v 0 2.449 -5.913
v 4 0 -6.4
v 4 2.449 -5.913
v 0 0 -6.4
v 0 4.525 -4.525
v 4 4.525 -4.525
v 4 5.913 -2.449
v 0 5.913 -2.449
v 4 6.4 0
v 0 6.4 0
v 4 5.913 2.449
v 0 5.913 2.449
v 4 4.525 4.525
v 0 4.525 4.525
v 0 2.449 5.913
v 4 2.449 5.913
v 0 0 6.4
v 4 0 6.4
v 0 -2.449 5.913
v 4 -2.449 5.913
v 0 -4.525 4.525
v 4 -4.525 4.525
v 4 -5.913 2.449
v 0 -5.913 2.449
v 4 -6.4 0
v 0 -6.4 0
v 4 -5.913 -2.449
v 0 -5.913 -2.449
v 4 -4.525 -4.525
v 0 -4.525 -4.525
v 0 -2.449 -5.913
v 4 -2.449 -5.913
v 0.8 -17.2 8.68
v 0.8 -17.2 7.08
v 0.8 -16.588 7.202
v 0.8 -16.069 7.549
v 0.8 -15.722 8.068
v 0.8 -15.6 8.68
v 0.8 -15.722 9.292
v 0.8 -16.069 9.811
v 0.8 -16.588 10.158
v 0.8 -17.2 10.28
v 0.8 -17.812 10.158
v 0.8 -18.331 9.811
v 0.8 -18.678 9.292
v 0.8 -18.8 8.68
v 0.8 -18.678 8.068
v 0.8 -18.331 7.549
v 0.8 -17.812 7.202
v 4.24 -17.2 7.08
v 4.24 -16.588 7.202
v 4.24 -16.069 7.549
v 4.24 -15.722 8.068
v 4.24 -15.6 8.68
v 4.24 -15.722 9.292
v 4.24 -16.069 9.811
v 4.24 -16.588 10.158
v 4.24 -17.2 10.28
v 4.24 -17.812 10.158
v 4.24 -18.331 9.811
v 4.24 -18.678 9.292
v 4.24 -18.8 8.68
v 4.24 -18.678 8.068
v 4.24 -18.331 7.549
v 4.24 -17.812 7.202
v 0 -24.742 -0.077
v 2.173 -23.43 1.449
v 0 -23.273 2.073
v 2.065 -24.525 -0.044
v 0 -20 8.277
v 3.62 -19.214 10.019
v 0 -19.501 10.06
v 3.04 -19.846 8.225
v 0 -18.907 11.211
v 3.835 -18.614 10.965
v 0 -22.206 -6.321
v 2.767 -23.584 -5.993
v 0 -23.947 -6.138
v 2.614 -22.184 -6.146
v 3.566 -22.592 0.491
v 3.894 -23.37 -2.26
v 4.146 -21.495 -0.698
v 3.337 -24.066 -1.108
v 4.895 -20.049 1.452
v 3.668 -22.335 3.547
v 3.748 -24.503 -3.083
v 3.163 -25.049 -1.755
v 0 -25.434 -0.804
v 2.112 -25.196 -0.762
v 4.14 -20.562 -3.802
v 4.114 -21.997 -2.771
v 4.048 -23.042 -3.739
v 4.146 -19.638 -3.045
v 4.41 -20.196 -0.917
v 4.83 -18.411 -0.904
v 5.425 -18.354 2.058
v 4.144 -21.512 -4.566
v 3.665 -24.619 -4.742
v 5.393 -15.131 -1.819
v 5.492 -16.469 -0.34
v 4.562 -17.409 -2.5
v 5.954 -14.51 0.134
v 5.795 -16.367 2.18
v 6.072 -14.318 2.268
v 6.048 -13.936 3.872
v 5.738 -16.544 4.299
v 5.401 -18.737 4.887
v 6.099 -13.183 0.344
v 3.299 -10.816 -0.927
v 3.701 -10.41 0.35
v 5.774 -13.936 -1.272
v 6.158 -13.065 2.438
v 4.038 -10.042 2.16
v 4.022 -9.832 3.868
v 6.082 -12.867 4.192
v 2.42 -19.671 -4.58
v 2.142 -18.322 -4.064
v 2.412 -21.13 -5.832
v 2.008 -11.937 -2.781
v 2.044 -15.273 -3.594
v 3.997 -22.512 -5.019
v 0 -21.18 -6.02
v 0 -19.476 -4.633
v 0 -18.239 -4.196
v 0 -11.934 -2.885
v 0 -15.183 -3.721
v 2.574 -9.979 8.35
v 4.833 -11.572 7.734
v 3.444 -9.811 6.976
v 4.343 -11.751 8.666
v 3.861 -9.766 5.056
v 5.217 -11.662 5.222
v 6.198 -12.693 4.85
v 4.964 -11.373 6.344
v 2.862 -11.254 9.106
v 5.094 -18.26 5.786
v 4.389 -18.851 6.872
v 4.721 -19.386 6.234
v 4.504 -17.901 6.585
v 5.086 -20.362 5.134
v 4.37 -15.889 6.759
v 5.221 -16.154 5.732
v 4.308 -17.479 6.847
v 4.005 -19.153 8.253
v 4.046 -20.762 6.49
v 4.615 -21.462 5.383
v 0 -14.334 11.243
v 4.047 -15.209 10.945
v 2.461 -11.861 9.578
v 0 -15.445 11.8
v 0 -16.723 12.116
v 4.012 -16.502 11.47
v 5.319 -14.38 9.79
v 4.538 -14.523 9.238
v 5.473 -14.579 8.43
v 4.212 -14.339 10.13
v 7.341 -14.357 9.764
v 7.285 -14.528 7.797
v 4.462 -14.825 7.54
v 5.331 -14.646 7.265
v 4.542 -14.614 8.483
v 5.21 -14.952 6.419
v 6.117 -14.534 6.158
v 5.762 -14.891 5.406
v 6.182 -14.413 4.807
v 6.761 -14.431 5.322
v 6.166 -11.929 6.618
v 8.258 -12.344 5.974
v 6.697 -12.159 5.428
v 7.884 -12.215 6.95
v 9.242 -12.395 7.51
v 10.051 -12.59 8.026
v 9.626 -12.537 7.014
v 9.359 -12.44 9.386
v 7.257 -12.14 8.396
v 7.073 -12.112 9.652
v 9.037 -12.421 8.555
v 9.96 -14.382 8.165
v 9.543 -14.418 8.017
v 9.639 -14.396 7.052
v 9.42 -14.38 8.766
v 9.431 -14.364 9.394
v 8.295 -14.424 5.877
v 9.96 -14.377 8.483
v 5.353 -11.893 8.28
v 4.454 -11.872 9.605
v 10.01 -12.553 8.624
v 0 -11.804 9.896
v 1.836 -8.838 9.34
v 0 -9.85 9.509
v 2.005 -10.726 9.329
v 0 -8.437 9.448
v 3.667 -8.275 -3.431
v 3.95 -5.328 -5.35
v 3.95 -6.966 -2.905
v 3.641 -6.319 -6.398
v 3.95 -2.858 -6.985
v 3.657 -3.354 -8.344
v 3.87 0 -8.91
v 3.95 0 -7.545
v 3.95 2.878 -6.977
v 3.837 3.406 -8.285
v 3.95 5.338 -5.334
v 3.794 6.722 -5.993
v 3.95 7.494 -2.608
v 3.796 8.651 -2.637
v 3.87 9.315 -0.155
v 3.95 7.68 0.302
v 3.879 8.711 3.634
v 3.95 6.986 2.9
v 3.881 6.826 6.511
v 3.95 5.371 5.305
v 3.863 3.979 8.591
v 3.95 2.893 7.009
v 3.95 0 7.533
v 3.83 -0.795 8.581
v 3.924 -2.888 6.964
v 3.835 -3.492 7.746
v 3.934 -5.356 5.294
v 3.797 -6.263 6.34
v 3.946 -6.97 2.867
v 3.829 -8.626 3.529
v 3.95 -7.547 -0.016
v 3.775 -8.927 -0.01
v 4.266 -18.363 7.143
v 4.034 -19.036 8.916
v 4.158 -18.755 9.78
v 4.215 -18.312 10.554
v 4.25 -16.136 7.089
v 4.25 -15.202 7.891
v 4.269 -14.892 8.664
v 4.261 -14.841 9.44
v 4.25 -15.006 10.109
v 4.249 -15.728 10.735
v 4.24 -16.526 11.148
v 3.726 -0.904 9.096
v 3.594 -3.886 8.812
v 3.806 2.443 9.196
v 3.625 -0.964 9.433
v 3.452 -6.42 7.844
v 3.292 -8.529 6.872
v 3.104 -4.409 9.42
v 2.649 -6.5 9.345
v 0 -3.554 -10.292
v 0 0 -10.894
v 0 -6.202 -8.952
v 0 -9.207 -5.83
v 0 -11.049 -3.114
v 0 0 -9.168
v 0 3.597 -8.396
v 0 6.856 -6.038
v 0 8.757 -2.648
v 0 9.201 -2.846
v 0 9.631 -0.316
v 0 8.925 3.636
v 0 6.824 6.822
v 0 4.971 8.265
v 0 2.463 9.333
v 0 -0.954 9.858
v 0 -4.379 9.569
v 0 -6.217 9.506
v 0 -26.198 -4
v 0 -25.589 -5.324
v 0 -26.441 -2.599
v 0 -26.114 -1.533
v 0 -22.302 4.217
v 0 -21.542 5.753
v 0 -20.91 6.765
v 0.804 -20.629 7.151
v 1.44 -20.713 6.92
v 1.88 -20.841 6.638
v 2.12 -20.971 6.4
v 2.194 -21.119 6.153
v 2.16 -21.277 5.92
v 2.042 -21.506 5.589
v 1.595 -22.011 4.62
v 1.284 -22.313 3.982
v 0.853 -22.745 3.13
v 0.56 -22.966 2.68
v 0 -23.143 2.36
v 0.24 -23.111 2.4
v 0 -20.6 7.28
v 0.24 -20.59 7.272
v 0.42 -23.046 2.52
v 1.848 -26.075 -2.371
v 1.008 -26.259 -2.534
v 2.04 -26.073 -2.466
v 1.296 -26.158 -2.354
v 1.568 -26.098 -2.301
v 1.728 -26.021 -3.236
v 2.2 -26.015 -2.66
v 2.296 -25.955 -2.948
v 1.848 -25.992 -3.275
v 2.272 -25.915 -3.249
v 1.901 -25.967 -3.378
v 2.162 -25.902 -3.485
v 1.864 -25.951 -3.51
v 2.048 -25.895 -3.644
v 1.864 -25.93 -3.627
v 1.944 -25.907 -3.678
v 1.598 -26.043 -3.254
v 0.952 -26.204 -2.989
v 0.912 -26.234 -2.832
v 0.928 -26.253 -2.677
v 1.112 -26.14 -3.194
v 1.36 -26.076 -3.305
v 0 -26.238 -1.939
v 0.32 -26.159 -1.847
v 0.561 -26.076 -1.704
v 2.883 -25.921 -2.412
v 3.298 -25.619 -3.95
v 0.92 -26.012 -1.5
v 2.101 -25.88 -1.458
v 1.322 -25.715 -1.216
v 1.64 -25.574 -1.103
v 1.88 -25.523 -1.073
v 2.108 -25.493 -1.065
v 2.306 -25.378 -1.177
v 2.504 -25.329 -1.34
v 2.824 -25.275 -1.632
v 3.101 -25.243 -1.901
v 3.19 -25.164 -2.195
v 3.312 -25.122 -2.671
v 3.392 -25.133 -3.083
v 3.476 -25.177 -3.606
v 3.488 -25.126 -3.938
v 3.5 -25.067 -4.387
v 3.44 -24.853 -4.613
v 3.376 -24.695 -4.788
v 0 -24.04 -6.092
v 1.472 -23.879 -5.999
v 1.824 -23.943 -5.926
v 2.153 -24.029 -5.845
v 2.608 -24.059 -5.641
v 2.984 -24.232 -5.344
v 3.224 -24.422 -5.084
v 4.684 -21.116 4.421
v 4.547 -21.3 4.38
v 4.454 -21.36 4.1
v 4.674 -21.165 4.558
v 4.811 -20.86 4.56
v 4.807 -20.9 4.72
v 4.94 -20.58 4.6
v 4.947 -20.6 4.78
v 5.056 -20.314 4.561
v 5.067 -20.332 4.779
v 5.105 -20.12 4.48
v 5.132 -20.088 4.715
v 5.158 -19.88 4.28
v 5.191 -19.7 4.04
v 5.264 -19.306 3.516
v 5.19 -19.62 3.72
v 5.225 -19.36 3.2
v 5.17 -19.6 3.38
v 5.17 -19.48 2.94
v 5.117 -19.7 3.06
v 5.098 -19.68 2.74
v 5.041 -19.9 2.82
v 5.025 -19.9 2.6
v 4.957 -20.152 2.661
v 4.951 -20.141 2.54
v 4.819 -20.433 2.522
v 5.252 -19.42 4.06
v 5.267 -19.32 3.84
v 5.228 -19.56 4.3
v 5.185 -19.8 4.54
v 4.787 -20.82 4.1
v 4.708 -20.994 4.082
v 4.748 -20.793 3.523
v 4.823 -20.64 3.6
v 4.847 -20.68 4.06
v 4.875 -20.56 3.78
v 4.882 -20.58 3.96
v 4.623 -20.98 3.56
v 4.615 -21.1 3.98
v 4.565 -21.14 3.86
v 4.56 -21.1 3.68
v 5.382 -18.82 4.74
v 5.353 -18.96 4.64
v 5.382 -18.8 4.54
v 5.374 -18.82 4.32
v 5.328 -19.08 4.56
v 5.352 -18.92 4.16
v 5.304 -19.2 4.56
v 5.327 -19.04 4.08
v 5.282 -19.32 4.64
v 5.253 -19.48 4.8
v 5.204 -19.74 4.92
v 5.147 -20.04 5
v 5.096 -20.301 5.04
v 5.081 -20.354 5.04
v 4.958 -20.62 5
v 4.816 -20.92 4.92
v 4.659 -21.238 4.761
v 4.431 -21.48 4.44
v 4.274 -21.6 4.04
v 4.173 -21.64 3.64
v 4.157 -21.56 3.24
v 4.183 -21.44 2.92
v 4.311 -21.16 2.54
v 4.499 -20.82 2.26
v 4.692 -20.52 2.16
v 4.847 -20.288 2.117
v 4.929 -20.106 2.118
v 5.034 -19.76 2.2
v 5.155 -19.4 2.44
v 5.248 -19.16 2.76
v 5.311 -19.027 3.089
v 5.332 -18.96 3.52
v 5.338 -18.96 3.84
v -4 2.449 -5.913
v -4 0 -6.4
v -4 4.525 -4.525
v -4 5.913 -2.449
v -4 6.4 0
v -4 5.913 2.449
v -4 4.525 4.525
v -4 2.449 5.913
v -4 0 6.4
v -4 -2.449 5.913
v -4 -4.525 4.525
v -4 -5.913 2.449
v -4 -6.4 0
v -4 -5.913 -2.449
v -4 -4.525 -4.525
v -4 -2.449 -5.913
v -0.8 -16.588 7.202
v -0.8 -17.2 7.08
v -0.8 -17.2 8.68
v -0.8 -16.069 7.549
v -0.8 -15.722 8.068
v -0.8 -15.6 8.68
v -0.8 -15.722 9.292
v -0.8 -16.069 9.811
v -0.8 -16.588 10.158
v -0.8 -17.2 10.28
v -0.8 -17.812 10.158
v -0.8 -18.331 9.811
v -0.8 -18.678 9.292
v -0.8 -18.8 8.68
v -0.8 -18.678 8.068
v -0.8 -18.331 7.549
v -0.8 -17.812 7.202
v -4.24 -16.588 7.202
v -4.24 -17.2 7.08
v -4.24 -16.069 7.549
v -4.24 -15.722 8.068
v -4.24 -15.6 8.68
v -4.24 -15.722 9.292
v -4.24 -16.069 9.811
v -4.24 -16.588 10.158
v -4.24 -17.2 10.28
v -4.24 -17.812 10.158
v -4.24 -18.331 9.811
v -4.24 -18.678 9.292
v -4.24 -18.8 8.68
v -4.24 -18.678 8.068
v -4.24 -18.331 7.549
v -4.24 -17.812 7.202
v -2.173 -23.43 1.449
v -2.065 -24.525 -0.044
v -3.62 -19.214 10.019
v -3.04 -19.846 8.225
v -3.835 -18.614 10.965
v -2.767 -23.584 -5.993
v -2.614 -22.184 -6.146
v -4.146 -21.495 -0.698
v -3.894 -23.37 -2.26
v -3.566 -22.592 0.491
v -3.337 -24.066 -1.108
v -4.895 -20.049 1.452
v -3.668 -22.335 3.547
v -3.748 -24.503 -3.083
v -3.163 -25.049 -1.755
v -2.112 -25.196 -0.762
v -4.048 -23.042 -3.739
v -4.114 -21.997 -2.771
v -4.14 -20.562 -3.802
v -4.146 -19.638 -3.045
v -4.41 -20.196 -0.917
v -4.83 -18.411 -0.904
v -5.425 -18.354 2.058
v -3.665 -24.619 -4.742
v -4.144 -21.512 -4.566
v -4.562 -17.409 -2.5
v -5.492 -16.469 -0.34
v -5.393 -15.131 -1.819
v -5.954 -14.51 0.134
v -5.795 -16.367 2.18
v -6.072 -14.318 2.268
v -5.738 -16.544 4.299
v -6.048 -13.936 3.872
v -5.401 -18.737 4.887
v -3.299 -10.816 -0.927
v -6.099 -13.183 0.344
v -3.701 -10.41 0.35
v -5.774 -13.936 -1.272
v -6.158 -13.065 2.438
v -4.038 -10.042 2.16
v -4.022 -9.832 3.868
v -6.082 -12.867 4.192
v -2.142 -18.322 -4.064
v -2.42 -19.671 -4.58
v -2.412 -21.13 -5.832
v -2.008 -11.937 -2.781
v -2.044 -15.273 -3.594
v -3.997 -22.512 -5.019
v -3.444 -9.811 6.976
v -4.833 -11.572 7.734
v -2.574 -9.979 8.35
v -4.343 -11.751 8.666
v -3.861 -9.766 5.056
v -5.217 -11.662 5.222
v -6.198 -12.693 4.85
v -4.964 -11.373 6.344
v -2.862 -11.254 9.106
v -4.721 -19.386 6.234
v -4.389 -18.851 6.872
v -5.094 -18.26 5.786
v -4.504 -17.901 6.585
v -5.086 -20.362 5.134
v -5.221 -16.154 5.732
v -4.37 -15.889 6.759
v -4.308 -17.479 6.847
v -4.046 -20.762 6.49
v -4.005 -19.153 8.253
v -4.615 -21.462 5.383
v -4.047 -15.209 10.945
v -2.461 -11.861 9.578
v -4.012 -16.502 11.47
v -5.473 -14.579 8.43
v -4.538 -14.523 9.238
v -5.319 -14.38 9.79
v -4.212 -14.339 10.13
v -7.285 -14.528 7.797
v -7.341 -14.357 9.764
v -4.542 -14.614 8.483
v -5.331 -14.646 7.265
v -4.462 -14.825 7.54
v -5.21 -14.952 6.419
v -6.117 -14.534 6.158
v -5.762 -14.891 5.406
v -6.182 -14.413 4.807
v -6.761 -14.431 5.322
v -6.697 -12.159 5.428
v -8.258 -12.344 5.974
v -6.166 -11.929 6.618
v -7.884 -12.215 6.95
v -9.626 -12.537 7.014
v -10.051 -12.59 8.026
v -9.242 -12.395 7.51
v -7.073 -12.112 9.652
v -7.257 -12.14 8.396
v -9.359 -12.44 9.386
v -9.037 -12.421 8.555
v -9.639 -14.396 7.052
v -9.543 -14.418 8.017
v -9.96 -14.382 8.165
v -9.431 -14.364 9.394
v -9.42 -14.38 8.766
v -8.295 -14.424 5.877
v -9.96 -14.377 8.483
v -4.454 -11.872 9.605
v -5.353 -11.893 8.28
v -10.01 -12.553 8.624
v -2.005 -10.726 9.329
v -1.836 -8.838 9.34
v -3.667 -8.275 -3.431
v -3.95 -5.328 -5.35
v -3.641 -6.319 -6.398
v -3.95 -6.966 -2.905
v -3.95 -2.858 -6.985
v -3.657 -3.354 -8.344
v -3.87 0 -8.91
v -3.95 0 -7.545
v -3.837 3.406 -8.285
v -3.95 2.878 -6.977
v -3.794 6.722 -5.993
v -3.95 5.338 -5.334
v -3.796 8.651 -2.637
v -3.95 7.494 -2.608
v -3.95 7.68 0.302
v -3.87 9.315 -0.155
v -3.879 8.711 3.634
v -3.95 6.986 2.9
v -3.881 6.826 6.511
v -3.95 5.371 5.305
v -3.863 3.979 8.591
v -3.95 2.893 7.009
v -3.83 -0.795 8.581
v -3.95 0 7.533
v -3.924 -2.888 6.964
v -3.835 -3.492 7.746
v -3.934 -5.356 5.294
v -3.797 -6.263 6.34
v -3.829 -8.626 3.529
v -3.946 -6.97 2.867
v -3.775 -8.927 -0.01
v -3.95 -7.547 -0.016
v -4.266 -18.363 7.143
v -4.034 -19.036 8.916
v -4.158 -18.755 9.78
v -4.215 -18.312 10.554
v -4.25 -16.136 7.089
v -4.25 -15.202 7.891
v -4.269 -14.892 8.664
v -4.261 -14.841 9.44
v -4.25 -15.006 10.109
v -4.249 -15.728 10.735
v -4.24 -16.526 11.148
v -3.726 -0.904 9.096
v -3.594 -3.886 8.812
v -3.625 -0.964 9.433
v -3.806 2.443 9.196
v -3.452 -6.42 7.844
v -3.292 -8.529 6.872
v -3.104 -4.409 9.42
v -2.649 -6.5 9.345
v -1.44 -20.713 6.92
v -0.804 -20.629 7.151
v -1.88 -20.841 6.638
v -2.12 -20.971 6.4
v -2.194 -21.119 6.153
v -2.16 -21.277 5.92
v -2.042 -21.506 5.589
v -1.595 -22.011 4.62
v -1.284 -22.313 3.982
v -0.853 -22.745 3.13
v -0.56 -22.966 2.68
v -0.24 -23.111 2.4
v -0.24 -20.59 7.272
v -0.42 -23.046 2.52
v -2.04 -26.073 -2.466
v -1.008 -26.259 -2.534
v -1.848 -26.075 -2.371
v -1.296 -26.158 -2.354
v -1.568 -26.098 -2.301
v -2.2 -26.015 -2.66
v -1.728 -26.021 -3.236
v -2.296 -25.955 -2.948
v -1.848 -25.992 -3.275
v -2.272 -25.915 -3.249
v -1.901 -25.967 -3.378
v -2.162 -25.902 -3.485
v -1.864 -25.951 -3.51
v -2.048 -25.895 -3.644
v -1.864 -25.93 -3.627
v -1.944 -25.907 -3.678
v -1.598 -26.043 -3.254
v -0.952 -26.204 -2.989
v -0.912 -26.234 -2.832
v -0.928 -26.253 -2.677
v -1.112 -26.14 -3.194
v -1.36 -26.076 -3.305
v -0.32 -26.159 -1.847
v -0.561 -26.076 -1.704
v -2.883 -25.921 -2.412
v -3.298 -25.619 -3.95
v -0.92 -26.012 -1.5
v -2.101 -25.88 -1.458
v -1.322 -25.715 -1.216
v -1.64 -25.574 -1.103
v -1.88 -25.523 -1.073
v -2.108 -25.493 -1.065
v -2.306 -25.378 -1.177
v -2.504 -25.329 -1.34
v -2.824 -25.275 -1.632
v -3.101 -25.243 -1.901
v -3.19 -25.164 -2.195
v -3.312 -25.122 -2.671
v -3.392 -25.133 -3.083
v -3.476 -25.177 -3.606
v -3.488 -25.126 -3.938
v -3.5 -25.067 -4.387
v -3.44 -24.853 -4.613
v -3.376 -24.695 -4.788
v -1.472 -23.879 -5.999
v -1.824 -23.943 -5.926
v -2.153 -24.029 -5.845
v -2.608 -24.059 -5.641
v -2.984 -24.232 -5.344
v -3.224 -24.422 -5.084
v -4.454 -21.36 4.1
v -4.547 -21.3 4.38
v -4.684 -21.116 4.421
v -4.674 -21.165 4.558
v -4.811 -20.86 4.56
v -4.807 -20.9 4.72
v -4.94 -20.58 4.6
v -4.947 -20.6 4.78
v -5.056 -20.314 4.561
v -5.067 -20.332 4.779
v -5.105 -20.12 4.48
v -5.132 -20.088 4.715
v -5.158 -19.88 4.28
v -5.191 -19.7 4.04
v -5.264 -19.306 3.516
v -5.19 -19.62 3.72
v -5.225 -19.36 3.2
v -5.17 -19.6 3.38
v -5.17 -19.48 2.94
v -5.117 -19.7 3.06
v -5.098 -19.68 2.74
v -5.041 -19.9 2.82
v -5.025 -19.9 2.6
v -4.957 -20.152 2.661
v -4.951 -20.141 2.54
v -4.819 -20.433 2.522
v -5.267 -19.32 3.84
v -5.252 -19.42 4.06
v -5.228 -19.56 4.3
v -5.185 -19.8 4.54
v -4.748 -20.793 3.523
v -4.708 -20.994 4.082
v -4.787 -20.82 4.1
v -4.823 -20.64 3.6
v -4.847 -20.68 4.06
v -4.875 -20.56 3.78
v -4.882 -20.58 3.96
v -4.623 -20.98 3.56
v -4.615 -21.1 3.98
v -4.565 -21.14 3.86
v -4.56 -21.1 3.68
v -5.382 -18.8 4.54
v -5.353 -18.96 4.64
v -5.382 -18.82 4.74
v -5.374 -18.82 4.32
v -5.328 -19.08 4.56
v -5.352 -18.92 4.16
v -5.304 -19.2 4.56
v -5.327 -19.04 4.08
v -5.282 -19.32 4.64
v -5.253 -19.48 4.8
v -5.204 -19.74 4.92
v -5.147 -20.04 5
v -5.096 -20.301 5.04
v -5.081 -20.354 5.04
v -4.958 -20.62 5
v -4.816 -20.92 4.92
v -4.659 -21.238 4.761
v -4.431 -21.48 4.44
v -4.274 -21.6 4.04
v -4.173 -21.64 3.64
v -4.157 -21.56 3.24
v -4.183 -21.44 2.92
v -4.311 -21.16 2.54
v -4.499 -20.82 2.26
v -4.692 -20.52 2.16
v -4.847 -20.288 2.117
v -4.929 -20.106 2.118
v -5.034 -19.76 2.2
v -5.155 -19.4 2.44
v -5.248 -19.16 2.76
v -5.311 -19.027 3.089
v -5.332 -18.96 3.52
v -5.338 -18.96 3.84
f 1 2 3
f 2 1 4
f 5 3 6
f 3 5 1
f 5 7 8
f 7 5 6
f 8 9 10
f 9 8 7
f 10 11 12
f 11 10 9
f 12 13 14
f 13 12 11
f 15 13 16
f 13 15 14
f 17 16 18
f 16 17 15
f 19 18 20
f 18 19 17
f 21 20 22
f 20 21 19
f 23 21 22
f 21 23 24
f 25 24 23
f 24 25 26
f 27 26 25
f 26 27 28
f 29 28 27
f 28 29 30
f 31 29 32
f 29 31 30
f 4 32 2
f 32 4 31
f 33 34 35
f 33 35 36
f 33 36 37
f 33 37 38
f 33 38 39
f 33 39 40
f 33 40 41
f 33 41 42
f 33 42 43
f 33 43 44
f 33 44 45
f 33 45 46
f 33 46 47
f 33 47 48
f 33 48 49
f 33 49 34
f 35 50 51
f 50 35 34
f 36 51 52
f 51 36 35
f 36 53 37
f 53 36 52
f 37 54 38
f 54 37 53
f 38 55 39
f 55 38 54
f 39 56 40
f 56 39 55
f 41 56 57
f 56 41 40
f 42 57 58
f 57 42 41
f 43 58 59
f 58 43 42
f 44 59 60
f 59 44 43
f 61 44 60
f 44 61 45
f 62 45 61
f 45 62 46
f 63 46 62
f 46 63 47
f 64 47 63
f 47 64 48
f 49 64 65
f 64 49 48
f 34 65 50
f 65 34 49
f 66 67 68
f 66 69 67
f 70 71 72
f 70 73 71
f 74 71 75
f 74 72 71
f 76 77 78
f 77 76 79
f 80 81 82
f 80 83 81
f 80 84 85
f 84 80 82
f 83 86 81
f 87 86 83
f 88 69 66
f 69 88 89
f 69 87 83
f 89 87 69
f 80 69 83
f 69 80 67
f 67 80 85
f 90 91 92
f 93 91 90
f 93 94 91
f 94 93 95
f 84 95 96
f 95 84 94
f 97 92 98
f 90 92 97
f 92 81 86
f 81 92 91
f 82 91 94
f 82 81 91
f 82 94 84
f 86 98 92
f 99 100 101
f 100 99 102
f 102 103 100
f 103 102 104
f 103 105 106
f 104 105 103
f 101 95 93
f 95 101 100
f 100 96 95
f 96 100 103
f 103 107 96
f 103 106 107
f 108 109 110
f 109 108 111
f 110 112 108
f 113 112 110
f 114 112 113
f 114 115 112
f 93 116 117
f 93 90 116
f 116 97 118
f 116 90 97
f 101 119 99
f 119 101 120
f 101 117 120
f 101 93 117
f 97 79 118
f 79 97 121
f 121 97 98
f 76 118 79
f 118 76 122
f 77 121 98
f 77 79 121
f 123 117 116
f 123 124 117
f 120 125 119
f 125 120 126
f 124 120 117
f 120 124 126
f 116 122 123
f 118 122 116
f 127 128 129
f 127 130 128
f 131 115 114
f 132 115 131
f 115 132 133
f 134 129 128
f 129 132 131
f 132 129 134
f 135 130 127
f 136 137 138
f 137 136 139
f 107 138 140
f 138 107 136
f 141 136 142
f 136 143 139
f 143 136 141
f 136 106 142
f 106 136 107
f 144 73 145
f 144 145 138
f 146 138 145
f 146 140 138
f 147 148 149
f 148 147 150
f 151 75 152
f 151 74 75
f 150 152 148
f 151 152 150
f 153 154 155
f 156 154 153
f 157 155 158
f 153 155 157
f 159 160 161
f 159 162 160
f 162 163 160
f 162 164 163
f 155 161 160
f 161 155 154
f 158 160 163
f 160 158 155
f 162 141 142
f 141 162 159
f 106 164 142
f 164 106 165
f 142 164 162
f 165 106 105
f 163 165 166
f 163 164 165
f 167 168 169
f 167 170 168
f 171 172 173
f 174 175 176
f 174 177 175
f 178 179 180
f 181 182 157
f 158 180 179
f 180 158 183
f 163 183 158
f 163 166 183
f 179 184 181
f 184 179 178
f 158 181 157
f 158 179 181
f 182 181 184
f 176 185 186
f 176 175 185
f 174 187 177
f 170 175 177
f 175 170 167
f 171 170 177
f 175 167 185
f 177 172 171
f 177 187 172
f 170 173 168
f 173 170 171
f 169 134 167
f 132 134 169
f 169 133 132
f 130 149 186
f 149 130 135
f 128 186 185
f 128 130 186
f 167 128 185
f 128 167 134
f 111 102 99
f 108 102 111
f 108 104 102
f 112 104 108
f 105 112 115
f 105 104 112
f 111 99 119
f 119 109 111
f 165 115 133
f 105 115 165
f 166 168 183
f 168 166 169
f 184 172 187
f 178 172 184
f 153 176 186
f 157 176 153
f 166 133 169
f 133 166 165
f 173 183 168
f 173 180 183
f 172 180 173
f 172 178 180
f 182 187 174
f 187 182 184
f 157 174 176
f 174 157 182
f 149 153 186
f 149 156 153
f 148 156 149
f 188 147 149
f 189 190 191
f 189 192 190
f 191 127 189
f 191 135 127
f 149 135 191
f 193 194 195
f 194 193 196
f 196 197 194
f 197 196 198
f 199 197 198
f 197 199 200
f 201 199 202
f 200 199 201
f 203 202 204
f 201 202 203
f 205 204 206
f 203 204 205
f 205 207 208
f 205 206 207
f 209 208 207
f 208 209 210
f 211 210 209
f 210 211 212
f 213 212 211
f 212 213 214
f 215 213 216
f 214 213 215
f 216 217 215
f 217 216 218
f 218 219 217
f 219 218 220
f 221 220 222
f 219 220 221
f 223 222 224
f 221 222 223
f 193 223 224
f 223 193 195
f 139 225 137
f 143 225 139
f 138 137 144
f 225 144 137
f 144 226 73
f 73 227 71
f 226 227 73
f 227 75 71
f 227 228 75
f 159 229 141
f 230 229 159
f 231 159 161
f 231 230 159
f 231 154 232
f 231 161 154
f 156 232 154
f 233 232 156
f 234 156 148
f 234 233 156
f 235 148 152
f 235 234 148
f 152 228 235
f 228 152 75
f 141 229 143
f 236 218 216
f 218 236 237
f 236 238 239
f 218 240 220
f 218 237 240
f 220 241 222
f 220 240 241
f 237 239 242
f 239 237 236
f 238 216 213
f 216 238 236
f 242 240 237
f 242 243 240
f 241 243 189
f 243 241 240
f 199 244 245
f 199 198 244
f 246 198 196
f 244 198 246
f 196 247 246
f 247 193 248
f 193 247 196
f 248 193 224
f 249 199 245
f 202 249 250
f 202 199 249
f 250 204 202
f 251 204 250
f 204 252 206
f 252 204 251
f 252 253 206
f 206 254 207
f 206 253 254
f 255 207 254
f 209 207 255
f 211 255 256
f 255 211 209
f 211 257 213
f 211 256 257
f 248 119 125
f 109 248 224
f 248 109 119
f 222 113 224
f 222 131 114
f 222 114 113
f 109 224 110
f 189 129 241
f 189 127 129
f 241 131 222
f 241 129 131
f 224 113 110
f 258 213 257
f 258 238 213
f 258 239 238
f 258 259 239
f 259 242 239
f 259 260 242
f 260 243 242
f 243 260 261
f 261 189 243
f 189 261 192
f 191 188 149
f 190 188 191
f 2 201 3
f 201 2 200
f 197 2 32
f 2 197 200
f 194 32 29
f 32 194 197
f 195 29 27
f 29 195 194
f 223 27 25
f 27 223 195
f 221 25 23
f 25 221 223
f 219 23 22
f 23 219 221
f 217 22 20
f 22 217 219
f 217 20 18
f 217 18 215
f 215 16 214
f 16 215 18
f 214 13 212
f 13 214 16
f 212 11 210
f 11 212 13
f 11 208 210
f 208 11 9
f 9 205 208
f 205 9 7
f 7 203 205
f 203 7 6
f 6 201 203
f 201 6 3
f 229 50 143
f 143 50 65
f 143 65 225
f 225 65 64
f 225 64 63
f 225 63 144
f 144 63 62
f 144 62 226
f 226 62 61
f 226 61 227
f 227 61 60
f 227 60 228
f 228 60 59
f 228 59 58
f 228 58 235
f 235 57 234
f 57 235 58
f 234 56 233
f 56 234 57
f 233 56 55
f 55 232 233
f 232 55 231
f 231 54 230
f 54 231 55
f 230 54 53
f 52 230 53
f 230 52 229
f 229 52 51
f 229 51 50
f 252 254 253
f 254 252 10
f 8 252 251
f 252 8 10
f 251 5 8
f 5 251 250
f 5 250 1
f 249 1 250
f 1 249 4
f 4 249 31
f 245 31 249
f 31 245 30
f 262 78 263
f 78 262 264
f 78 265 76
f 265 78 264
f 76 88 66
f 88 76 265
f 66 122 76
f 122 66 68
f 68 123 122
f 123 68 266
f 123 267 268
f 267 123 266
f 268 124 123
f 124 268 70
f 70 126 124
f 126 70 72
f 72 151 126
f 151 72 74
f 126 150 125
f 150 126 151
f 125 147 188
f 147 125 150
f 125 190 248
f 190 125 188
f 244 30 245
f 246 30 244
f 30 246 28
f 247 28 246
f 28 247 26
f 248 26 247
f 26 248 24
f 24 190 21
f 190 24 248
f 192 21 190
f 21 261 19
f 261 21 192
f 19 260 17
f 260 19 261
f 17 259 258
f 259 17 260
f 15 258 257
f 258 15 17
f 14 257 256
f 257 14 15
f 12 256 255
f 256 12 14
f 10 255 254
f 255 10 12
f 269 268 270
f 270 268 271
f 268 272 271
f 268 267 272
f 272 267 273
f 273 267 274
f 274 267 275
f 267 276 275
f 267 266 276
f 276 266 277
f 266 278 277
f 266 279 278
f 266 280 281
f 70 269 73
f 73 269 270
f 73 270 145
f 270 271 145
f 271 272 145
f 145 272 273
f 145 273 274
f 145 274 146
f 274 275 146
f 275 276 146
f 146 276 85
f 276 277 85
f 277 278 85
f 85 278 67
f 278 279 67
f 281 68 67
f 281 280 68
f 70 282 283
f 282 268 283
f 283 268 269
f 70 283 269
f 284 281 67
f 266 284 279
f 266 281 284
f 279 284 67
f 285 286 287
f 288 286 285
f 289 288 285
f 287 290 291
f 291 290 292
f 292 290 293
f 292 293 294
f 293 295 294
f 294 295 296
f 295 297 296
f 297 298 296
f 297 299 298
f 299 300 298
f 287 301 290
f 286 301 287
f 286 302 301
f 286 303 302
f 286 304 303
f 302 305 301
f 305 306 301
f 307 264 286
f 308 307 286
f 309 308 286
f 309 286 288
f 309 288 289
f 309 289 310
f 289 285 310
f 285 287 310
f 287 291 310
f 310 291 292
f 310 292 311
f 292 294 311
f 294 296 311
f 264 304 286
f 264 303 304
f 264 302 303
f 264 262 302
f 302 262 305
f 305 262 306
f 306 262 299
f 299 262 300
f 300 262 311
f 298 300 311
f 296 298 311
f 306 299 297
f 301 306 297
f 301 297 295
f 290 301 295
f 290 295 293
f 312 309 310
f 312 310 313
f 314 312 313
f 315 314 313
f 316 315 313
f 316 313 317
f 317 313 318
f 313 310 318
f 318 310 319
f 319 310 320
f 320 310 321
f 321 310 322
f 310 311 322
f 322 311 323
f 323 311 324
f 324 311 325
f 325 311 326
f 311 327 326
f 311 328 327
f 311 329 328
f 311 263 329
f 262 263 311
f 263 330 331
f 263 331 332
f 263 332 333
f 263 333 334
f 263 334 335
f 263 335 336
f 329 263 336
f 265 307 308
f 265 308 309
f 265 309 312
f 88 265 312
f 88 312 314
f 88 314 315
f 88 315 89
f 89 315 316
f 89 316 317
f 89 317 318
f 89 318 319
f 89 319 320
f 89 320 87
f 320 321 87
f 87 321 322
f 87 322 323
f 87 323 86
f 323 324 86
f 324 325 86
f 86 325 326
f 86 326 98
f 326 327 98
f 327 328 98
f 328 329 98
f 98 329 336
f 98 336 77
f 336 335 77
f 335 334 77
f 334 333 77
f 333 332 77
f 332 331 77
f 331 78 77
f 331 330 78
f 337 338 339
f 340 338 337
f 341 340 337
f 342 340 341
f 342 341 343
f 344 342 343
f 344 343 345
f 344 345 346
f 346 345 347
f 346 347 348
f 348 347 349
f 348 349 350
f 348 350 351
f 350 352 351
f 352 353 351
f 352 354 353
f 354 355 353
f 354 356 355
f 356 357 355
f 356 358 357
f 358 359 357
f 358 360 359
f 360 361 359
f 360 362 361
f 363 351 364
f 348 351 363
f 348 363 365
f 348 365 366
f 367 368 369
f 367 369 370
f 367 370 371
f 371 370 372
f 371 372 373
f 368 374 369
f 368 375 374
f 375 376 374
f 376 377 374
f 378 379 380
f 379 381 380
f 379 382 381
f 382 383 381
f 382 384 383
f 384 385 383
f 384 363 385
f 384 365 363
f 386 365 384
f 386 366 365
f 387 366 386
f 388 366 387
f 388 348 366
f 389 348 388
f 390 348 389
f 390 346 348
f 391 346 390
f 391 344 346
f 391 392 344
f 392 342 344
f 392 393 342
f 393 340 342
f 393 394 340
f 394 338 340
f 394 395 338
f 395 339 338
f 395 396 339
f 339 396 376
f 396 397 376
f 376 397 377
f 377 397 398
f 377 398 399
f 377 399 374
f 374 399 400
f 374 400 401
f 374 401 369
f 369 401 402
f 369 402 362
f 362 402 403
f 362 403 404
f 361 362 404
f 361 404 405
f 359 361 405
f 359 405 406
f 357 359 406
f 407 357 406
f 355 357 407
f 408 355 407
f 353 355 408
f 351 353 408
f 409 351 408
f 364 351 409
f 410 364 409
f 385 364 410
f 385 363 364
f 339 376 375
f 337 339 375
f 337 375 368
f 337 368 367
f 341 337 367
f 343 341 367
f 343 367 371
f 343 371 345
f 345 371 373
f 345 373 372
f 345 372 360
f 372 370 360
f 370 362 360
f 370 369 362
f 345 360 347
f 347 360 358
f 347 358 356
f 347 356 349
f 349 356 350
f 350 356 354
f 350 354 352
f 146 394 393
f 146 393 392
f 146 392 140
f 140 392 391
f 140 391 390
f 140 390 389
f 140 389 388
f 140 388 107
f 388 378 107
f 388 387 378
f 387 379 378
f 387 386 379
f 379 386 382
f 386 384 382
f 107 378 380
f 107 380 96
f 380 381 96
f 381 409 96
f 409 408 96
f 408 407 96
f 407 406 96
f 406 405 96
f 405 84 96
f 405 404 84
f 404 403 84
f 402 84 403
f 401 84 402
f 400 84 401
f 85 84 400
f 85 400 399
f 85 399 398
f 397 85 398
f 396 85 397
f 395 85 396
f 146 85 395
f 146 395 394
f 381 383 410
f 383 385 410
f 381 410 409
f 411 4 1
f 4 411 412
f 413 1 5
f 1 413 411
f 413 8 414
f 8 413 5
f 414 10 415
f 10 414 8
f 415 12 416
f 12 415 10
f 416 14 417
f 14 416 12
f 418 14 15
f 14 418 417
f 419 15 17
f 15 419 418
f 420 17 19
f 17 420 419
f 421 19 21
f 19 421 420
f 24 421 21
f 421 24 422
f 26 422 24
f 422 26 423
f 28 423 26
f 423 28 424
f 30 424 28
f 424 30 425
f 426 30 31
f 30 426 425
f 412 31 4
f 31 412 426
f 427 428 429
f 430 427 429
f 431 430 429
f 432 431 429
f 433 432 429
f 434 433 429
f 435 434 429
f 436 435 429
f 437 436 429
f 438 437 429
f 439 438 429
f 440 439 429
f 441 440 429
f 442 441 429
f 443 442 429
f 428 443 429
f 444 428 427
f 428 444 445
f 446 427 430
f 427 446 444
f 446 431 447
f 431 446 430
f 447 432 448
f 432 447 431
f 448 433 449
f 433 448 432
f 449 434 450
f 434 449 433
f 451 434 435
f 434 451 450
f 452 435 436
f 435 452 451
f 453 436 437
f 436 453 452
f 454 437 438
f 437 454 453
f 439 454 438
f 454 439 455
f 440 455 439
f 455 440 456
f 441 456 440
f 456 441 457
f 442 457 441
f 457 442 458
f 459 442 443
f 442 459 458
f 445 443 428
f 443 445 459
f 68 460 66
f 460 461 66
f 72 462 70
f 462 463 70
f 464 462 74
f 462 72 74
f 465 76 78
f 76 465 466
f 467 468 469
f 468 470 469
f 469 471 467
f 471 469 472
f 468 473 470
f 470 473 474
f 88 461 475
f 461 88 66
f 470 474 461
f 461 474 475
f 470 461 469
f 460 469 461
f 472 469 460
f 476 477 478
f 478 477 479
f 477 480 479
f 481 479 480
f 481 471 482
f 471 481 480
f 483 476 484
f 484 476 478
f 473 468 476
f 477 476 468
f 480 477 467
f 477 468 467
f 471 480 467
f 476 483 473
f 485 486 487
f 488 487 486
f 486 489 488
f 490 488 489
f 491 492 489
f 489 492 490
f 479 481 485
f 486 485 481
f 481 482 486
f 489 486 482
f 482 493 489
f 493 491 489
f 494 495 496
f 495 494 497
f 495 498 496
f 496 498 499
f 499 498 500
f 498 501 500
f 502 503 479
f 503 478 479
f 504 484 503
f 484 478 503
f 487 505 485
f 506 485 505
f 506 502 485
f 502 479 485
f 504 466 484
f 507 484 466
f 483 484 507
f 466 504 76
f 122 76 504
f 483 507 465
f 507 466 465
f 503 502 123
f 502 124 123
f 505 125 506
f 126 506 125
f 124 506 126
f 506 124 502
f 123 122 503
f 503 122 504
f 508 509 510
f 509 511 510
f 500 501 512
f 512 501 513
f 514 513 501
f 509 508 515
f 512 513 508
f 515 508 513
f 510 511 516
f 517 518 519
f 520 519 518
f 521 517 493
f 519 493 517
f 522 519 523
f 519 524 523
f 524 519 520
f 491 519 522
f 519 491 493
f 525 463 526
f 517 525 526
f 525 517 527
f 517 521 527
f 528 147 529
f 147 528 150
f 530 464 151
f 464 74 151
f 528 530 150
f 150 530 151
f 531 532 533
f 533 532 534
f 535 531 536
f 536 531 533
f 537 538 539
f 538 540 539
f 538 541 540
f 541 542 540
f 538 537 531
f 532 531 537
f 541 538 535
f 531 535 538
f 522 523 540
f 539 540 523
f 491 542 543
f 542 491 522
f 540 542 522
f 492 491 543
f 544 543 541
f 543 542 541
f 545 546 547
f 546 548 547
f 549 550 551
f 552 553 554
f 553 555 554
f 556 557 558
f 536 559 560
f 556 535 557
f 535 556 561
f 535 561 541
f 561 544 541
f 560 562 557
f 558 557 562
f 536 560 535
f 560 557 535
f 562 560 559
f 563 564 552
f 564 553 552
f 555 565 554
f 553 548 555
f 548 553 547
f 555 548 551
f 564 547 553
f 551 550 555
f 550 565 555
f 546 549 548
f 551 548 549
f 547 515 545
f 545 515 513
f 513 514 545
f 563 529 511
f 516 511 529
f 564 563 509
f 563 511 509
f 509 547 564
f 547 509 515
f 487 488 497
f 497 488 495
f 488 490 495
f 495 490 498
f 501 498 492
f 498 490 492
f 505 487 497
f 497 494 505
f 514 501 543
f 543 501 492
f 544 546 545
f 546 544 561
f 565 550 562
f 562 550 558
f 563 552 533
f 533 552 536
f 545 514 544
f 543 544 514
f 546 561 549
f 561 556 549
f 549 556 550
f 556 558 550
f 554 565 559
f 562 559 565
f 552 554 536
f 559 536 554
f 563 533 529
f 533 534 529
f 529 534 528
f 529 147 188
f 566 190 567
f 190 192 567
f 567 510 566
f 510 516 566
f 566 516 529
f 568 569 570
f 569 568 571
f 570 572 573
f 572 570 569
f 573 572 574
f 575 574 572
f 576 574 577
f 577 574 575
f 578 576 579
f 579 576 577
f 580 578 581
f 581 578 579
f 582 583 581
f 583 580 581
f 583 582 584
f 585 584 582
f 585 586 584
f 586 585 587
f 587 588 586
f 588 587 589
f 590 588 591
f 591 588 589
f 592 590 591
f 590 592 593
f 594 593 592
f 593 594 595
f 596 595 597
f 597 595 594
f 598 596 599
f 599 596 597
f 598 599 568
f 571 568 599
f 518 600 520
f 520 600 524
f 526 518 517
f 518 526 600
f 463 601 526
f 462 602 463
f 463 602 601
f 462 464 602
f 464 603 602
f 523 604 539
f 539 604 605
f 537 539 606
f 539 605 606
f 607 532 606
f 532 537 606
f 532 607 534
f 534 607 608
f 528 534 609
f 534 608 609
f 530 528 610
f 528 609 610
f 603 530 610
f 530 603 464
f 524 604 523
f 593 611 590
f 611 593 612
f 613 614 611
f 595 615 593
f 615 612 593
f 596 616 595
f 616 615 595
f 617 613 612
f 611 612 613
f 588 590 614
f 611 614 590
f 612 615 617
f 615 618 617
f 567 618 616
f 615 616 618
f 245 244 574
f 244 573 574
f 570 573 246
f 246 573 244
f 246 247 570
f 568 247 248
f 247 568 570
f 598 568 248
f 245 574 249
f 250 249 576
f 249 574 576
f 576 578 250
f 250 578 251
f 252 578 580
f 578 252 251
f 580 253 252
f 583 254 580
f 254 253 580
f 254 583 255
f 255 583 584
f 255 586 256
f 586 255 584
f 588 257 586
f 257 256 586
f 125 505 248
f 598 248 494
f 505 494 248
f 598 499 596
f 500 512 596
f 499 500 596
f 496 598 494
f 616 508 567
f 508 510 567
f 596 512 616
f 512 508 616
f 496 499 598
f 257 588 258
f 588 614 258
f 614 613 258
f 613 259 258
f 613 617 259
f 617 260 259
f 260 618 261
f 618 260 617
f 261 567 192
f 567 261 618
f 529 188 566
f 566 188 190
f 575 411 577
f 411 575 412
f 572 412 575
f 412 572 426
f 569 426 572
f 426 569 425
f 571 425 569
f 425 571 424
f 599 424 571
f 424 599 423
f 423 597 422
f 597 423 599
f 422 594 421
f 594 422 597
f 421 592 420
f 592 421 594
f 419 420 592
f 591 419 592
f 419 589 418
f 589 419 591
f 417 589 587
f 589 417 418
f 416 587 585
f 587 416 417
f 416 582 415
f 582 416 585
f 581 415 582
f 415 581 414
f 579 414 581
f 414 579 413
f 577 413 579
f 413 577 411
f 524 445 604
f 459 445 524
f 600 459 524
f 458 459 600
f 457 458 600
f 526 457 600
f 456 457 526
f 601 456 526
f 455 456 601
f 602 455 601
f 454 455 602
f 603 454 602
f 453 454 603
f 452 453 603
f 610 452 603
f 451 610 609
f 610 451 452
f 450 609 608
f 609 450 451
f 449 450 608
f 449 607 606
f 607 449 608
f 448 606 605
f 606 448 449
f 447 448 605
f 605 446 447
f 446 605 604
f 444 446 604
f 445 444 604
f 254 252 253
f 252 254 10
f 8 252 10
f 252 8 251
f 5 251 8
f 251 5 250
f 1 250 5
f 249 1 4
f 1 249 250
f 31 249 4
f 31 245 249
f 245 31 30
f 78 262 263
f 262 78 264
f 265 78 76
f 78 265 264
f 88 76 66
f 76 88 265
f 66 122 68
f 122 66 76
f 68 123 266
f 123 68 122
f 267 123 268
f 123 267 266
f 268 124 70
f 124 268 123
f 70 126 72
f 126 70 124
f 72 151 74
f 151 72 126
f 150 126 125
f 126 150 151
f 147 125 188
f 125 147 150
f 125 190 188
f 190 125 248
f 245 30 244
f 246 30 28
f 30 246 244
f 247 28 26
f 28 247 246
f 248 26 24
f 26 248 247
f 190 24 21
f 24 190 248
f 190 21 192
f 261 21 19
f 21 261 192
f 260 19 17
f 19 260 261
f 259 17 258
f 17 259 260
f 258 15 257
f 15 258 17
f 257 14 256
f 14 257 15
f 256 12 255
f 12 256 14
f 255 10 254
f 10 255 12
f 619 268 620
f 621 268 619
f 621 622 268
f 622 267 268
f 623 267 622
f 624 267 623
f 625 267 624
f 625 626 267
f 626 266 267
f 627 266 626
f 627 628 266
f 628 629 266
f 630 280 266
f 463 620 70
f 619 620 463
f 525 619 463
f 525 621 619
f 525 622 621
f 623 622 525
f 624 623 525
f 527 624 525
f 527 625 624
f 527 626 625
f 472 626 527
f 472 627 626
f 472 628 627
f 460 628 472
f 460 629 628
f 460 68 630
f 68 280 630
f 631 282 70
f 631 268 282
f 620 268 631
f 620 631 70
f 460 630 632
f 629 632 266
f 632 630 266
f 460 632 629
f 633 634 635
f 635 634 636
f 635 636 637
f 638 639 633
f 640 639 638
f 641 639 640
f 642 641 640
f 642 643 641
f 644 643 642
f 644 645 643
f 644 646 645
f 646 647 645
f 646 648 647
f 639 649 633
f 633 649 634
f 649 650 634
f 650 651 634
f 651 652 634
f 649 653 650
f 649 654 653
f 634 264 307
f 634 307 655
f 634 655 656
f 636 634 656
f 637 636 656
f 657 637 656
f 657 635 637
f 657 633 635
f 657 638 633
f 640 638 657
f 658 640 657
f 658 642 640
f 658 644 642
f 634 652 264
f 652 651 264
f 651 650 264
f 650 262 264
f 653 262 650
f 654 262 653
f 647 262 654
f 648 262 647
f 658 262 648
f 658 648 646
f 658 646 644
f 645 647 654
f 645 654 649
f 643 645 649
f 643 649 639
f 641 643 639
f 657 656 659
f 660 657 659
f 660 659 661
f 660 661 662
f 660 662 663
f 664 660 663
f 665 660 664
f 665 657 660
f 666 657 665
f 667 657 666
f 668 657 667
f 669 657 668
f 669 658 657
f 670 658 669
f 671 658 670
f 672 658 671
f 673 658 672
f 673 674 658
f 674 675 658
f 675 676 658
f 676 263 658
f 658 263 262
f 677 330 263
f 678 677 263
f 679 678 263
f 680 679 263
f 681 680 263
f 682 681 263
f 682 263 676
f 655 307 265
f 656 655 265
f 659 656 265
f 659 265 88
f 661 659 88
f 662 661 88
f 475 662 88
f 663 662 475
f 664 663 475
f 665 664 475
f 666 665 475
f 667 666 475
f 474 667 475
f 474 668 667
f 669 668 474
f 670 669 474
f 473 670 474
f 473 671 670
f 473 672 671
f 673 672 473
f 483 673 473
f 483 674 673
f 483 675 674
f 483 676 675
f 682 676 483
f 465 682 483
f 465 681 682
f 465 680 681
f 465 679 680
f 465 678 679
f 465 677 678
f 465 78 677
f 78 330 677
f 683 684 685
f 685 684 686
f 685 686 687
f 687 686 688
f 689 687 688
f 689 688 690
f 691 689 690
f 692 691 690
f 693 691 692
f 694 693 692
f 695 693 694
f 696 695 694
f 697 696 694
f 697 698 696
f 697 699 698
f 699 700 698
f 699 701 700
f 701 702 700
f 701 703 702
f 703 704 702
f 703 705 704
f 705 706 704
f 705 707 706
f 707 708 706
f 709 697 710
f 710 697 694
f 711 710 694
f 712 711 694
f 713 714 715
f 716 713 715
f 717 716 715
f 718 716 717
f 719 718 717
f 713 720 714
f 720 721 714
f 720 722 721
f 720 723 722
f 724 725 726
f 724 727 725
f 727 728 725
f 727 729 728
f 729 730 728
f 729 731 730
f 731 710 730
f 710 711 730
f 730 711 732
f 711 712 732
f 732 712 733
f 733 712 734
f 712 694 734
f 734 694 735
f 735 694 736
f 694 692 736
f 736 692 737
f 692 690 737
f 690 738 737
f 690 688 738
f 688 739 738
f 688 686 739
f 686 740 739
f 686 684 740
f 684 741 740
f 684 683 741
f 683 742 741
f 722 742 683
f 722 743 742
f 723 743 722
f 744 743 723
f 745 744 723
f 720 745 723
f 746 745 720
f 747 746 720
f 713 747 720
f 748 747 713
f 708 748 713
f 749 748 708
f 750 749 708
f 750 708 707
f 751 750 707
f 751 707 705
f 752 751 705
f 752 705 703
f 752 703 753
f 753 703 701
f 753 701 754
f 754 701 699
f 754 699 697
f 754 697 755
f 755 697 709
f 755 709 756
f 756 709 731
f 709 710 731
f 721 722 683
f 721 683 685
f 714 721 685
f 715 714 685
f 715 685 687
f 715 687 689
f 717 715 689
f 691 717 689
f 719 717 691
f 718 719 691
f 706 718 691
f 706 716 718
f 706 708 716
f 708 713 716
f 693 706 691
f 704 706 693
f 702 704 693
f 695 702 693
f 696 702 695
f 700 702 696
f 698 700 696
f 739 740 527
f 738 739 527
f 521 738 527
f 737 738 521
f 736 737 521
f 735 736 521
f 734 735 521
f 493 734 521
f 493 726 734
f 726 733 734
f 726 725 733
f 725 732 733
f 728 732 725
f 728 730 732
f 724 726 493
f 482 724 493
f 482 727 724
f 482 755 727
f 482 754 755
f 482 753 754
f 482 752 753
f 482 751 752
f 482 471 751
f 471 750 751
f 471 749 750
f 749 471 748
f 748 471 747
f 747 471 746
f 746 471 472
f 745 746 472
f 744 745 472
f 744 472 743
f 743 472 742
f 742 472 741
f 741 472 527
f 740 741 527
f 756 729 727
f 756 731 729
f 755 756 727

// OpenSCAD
use <../lib.scad>
use <64780p01.scad>
use <64835p01.scad>
$fa=1; $fs=0.2;
function ldraw_lib__64835p01c01(realsolid=false) = [
// 0 Animal Cow Head with Blaze, Muzzle and Eye Pattern
// 0 Name: 64835p01c01.dat
// 0 Author: Philippe Hurbain [Philo]
// 0 !LDRAW_ORG Shortcut UPDATE 2015-01
// 0 !LICENSE Licensed under CC BY 2.0 and CC BY 4.0 : see CAreadme.txt
// 
// 0 !HELP Horns coordinates: X=+/-10.6, Y=-21.7 , Z=-43
// 
// 0 BFC CERTIFY CCW
  [0,"BFC","CERTIFY"],
  [0,"BFC","CCW"],
// 
// 0 !HISTORY 2013-12-19 {LEGO Digital Designer} Original part shape
// 0 !HISTORY 2013-12-19 [Philo] File preparation for LDraw Parts Tracker
// 0 !HISTORY 2015-10-11 [PTadmin] Official Update 2015-01
// 
// 
// 1 16 0 0 0 1 0 0 0 1 0 0 0 1 64835p01.dat
  [1,16,0,0,0,1,0,0,0,1,0,0,0,1, ldraw_lib__64835p01(realsolid)],
// 1 16 0 0 0 1 0 0 0 1 0 0 0 1 64780p01.dat
  [1,16,0,0,0,1,0,0,0,1,0,0,0,1, ldraw_lib__64780p01(realsolid)],
];
module ldraw_lib__64835p01c01(step=0, col=false, unit=2/5, alt=false, line=0.2, solid=!$preview)
    makepoly(ldraw_lib__64835p01c01(solid), step=step, col=col, unit=unit, alt=alt, line=line, solid=solid);
ldraw_lib__64835p01c01(line=0.2);
